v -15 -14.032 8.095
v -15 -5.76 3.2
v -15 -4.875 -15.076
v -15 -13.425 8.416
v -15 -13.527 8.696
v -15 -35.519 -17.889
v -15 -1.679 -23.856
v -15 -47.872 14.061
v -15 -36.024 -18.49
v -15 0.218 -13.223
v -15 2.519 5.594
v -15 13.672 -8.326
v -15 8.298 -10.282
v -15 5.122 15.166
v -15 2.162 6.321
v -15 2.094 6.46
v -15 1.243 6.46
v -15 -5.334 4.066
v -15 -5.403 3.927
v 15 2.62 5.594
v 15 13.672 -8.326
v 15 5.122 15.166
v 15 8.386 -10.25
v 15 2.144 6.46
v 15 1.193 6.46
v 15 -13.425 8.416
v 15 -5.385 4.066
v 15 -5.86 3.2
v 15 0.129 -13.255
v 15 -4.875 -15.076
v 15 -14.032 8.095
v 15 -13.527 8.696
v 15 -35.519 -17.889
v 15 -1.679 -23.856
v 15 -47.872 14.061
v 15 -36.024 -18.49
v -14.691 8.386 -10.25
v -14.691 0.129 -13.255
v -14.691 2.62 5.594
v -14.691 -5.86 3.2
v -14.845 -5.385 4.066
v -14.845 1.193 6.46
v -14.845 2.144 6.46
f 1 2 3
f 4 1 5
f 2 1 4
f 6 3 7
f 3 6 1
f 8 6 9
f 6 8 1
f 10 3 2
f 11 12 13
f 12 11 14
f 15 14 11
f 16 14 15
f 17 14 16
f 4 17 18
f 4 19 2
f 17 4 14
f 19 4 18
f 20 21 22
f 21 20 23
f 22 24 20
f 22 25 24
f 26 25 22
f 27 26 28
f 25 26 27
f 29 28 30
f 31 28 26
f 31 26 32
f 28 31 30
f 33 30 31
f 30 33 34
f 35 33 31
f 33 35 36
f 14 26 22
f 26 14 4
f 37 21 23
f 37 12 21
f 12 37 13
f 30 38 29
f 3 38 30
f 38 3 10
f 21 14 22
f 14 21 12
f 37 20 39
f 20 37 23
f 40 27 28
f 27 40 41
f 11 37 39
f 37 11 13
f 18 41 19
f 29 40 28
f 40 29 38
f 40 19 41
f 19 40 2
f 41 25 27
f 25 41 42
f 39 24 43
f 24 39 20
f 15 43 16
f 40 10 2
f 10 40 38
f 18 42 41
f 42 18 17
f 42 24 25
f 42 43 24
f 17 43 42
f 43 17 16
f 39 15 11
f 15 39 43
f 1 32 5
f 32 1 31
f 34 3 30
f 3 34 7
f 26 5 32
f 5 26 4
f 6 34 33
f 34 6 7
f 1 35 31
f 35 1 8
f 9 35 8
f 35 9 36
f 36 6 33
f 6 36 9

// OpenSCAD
module bloop(){
minkowski(){
rotate([20,0,0]){
cube([30,7,20], center=true);
}//end of rotate
	 sphere(r=1,h=1);
}//end of minkowski
}//end of bloop (inside part)

module danger(){
rotate([50,0,0]){
rotate([0,90,0])
cylinder(r1=20, r2=20, h=30, $fn=3);
}//end of rotate
}//end of danger (triangle)


difference(){
rotate([20,0,0])
cube([30,20,25], center=true);//main clip

translate([0,1.8,-5])
bloop();//inside part
}

translate([-15,-17,-11])
danger();//not janky triangle

rotate([20,180,0]){
translate([-15,-31,10])
danger();
}//end of rotate (THIS IS THE ONE THAT IS FUCKED UP)
